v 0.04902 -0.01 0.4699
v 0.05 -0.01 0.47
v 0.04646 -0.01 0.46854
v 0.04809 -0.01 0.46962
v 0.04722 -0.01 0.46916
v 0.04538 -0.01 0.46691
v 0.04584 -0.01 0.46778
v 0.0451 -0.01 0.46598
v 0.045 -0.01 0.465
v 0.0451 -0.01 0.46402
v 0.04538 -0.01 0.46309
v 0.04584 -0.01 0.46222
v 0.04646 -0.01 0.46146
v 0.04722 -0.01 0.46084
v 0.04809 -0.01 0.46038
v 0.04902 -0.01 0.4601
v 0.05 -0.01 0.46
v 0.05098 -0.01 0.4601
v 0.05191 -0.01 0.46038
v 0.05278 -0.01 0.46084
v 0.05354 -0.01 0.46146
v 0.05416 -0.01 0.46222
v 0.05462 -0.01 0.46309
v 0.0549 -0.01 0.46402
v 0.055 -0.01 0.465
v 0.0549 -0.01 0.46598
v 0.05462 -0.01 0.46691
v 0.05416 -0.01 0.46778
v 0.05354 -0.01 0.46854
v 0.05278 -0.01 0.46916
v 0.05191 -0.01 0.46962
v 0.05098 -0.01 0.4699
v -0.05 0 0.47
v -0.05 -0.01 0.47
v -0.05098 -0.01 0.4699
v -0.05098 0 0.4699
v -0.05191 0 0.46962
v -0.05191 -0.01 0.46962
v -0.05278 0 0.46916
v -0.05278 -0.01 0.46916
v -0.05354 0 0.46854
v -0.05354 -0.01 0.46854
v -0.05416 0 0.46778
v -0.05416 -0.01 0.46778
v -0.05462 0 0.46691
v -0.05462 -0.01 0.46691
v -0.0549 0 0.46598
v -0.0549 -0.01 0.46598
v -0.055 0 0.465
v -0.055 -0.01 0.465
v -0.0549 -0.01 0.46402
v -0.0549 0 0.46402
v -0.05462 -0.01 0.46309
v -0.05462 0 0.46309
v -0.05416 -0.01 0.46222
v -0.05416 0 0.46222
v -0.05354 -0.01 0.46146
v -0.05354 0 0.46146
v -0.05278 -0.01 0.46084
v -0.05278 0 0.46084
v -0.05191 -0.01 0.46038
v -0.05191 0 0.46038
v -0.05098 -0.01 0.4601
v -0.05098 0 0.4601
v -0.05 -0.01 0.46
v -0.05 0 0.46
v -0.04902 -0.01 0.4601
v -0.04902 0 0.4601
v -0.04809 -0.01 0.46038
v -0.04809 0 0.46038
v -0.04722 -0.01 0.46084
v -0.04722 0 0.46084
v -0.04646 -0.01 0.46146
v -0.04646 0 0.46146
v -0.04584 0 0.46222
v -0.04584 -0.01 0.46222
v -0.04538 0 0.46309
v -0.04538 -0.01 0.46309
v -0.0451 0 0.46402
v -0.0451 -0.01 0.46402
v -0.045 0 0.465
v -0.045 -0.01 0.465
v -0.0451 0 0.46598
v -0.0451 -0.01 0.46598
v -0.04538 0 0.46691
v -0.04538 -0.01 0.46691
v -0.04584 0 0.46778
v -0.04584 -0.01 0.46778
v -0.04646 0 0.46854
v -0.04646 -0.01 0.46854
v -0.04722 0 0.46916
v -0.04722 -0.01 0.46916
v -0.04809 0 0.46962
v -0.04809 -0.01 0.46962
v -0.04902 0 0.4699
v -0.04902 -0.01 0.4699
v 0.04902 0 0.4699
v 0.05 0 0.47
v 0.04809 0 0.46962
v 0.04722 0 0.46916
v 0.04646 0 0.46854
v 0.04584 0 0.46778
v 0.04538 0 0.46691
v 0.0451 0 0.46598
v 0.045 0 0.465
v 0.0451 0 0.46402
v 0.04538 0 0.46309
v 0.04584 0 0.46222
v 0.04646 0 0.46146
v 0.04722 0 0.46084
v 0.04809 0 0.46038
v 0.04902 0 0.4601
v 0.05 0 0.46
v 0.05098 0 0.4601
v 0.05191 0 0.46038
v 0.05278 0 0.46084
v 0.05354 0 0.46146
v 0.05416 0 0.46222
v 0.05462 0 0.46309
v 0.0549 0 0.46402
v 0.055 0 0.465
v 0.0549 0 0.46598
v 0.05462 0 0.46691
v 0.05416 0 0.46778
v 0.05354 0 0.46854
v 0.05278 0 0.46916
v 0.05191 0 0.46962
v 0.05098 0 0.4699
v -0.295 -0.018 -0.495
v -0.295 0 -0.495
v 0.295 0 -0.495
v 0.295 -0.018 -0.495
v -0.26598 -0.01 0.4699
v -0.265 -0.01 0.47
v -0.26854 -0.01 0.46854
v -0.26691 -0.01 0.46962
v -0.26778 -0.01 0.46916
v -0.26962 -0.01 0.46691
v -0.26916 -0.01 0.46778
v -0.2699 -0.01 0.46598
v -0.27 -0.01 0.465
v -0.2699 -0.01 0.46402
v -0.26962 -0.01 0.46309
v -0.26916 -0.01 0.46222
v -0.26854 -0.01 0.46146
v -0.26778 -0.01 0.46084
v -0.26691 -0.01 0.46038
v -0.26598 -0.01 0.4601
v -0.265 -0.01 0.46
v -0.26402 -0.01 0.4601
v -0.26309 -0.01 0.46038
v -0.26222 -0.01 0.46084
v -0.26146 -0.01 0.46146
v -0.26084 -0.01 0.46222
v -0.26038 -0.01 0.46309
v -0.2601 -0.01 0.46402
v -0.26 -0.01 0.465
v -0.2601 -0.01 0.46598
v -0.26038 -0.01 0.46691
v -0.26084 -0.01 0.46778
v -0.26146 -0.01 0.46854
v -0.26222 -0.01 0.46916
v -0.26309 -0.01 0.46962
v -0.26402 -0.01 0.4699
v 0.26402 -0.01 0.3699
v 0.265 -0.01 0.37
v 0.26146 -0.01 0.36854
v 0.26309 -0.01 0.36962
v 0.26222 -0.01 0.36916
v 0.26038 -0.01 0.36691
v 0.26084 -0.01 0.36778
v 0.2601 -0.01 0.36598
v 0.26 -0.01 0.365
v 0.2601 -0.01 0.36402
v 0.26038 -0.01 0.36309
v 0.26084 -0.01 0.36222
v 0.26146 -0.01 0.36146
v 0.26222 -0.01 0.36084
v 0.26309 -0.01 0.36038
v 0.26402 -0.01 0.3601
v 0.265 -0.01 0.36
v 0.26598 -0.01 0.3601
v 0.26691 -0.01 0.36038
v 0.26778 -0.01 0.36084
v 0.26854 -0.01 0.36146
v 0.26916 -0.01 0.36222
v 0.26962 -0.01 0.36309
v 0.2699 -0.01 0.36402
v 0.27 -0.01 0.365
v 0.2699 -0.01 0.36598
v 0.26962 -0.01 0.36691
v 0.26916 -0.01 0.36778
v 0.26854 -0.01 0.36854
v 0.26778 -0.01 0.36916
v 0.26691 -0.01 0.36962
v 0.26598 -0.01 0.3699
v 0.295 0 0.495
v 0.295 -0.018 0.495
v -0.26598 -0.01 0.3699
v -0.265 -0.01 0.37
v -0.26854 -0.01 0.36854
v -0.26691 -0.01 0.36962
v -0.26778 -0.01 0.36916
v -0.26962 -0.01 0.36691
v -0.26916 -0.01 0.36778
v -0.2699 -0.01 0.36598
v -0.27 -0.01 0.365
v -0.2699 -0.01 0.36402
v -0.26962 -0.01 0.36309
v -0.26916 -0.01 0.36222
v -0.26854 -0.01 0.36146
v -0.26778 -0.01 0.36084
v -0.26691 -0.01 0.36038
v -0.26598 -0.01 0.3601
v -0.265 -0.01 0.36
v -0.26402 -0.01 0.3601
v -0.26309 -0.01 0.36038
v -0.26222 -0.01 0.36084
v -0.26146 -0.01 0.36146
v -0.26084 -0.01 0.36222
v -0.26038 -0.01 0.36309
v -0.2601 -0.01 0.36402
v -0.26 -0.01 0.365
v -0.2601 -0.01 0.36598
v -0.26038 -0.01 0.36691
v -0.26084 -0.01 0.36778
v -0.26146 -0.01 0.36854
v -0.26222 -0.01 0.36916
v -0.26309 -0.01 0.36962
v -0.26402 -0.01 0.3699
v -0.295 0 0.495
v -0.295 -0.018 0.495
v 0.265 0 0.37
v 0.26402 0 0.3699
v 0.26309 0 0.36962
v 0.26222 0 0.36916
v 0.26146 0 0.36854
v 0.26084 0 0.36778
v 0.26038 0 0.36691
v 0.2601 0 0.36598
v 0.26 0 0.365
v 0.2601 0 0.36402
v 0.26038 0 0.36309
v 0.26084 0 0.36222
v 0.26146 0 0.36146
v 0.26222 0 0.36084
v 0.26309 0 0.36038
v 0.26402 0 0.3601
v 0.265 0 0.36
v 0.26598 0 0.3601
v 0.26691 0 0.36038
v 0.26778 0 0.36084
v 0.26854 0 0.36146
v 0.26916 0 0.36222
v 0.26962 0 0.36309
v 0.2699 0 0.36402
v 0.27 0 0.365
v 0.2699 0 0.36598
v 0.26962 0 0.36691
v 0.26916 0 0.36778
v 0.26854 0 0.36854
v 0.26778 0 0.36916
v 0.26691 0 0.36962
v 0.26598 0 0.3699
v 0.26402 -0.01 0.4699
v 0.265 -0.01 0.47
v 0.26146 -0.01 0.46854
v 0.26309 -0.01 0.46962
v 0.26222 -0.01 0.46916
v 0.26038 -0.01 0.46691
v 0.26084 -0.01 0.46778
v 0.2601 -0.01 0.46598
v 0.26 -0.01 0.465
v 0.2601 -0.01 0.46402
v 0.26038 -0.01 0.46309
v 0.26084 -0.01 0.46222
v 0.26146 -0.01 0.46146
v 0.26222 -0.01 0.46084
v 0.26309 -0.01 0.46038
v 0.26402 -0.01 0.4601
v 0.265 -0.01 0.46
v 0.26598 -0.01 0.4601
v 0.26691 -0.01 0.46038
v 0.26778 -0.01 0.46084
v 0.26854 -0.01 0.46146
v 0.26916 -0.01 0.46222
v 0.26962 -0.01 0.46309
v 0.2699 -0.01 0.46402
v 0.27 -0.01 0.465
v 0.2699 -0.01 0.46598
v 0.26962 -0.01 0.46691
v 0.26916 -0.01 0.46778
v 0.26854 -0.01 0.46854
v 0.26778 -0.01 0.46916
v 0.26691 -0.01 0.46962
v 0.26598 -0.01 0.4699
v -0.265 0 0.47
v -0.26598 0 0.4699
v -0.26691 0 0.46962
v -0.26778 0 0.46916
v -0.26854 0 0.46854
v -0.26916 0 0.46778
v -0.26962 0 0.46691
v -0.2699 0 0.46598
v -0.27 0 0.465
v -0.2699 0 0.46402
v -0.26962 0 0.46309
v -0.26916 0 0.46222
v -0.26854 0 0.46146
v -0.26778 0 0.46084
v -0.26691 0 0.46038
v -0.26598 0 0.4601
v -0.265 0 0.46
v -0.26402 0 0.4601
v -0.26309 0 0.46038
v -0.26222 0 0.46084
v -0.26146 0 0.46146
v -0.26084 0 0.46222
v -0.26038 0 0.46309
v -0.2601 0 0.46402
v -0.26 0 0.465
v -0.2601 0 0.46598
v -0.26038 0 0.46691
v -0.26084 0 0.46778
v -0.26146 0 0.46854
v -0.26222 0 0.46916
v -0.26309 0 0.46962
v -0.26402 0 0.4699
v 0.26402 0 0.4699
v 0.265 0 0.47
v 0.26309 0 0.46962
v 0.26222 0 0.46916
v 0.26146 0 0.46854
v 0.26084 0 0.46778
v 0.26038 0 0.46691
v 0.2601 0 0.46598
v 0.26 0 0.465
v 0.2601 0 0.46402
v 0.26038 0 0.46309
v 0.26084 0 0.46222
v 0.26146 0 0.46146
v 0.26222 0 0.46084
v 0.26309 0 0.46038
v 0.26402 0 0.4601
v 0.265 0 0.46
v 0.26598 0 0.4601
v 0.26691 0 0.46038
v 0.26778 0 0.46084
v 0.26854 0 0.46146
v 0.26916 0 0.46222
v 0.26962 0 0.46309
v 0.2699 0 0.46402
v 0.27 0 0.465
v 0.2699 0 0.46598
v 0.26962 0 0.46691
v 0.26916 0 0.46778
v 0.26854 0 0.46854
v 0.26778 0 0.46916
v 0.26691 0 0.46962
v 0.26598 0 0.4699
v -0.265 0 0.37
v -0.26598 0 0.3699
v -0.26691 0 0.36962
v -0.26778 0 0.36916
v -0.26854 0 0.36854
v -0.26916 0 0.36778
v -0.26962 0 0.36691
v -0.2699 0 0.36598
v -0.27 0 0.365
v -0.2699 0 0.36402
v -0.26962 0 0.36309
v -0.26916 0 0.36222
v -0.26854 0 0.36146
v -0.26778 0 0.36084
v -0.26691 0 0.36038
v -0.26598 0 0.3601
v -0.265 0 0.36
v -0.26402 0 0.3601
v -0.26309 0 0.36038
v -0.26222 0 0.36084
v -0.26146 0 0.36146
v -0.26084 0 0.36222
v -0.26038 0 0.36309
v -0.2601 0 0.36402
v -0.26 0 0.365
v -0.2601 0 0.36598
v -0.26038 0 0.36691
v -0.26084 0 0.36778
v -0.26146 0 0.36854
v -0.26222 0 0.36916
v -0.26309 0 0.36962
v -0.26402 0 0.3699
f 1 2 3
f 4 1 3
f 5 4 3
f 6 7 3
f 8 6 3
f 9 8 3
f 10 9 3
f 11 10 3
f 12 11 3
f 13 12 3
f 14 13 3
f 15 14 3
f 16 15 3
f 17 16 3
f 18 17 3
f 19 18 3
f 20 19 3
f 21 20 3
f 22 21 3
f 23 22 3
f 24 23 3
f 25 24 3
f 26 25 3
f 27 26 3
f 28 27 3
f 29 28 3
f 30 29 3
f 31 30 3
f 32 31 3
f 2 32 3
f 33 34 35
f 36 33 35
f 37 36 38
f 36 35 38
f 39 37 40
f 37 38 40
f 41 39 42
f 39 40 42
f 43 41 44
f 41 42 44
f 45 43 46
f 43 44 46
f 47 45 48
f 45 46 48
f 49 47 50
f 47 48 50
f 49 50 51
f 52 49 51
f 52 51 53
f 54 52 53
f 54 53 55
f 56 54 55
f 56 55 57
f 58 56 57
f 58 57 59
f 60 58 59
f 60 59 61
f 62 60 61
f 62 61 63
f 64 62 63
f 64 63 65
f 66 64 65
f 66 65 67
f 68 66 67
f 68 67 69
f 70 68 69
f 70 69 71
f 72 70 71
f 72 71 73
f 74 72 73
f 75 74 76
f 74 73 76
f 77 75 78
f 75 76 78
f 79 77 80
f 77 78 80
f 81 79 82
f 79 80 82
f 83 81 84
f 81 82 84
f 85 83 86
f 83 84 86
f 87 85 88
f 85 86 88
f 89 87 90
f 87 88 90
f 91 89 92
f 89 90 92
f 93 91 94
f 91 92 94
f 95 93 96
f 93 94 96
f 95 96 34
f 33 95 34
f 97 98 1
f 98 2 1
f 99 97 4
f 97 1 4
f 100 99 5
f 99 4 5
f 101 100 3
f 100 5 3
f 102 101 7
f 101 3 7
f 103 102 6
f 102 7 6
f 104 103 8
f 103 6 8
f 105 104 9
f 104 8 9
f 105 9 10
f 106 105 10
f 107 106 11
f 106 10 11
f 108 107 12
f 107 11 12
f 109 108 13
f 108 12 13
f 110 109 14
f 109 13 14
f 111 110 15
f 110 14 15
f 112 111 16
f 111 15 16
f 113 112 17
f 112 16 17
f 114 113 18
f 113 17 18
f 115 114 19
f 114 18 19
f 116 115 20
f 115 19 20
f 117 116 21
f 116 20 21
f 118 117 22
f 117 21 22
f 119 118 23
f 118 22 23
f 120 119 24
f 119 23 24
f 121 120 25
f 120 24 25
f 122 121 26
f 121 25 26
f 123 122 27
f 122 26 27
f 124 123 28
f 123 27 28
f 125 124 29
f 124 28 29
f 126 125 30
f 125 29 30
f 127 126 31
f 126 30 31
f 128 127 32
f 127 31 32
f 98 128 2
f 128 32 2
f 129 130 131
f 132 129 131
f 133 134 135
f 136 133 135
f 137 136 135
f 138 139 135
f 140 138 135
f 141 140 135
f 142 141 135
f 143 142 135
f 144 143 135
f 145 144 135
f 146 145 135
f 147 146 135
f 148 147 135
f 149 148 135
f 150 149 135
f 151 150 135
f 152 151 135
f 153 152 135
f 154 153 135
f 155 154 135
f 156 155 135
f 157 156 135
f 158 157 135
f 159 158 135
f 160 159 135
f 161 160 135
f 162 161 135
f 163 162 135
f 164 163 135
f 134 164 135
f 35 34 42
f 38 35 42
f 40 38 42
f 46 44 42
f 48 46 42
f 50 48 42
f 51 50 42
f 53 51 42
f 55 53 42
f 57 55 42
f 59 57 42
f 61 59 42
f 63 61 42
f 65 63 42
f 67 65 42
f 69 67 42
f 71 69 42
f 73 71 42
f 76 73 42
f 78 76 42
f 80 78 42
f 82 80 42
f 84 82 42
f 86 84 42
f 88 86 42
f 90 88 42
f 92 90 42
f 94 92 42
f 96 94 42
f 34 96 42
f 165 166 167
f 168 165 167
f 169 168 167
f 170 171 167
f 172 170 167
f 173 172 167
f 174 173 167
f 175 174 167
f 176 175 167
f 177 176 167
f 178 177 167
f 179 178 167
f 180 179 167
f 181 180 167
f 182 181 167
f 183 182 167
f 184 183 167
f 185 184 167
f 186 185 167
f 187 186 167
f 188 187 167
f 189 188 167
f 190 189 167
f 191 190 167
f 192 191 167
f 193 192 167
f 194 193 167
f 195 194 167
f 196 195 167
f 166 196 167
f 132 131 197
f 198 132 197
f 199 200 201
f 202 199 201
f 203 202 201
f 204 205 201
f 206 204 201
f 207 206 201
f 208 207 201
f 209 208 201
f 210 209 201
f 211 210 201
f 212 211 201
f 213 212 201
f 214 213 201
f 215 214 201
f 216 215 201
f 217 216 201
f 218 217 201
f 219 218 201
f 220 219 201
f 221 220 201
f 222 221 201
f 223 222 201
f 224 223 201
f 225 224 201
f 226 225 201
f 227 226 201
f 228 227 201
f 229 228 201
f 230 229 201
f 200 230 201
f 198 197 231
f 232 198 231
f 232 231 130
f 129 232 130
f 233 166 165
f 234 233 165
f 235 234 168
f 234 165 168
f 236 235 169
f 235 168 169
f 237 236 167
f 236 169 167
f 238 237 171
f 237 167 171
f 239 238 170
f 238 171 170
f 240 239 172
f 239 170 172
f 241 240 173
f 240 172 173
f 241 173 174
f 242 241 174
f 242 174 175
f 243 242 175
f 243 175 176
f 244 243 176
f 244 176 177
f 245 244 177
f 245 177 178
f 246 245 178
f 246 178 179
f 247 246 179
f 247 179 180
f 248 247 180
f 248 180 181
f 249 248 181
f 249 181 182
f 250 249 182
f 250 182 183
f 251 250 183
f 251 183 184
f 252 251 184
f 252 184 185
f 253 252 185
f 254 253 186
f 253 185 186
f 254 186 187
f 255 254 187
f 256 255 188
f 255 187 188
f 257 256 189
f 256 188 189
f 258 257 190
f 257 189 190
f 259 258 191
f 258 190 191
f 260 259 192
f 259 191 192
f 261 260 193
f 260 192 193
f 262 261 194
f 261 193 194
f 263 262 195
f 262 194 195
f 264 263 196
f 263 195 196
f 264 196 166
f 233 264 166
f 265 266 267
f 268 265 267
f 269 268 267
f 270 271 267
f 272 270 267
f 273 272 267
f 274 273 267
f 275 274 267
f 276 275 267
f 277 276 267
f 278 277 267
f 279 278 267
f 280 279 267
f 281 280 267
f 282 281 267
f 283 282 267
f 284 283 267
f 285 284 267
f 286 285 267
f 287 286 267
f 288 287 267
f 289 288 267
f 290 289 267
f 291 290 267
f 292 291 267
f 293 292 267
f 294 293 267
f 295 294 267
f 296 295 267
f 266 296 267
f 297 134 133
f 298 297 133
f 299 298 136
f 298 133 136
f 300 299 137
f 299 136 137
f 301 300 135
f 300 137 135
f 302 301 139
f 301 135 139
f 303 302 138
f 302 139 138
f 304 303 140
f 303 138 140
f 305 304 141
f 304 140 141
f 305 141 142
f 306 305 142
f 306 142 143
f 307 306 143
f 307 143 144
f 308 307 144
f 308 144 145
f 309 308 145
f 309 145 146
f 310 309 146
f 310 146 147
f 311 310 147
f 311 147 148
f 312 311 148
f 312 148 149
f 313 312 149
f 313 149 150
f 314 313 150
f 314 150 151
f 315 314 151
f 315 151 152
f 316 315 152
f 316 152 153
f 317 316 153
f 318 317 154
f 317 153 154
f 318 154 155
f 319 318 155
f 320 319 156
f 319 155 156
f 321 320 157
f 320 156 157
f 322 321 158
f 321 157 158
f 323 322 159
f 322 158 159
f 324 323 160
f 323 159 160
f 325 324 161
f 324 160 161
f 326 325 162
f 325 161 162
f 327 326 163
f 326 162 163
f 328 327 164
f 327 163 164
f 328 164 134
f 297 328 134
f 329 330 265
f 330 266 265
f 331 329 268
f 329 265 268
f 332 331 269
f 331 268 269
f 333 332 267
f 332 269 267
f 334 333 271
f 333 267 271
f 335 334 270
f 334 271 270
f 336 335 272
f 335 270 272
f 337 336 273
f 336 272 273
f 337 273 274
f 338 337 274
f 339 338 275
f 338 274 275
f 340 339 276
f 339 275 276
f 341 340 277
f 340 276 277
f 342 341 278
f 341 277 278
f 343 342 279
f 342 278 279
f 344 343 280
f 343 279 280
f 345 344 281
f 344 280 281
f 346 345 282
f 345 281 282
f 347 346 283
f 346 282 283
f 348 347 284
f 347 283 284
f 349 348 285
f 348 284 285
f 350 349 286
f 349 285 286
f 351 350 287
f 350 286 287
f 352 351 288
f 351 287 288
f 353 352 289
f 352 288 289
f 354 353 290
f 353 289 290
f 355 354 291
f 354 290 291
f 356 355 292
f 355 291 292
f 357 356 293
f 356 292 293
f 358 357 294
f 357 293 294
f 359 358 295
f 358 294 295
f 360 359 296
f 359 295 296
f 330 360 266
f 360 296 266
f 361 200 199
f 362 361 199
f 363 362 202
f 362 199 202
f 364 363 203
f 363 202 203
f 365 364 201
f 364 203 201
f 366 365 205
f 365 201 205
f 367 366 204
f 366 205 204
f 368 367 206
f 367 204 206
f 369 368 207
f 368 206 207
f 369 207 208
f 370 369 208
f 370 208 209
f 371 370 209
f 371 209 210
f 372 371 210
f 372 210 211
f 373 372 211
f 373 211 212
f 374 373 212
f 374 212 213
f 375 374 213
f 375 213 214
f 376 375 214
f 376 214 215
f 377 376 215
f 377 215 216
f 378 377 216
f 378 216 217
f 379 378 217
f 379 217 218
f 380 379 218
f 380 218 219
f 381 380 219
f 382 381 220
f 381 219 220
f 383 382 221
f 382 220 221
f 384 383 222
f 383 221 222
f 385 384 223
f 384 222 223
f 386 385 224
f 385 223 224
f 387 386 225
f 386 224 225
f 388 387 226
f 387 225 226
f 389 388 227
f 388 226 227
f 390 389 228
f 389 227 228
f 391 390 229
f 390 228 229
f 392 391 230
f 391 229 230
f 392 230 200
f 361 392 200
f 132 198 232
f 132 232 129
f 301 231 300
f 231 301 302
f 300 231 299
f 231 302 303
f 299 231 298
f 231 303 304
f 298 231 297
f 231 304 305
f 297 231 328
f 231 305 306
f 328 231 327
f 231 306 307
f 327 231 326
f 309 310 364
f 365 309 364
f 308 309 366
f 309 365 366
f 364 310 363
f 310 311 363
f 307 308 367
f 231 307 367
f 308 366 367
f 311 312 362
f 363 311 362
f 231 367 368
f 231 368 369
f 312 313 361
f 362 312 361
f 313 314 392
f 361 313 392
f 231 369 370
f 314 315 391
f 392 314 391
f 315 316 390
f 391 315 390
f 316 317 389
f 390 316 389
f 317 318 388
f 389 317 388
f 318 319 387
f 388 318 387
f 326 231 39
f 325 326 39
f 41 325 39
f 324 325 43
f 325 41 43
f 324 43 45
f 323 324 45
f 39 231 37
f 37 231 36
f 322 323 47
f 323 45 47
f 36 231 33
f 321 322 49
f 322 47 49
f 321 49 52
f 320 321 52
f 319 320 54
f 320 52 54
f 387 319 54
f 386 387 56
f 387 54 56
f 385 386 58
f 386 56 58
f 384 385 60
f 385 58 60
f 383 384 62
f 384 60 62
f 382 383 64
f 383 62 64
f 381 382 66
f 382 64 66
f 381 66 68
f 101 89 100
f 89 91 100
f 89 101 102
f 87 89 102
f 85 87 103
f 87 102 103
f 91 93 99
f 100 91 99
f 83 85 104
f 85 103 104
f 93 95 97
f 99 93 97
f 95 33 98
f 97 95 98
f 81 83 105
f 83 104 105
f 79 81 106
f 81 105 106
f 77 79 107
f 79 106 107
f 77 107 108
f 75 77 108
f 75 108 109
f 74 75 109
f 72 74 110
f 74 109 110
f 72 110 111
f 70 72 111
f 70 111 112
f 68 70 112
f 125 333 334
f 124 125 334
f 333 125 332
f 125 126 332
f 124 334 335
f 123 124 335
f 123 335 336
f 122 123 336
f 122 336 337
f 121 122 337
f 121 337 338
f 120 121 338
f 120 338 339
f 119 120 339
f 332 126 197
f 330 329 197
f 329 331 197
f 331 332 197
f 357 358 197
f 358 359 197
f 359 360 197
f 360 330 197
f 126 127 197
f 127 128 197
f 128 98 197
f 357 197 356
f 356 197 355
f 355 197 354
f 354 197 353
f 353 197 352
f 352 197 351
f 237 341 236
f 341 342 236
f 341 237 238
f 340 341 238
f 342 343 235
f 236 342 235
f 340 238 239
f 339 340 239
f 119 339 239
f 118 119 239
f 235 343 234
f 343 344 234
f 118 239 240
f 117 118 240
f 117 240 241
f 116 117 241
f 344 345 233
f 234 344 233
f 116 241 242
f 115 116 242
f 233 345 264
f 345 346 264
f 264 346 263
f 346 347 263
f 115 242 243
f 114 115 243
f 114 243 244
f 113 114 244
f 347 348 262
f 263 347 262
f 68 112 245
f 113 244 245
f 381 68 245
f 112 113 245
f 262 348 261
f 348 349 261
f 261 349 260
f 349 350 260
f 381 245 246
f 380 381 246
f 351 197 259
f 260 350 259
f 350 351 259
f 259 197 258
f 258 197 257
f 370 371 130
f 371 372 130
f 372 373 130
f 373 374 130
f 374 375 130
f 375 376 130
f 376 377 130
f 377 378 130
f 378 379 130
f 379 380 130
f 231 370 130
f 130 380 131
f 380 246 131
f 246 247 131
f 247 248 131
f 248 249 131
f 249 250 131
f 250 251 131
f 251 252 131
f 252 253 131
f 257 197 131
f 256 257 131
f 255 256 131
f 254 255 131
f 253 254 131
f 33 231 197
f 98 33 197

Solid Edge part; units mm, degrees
sketch "Sketch1" plane through (0, 0, 0) normal (0, -1, 0) x (1, 0, 0)
  line L0 (-0.295, -0.495) -> (0.295, -0.495)
  line L1 (0.295, -0.495) -> (0.295, 0.495)
  line L2 (0.295, 0.495) -> (-0.295, 0.495)
  line L3 (-0.295, 0.495) -> (-0.295, -0.495)
  dimension "D1" = 0.99
  dimension "D2" = 0.59
extrude "Protrusion1" add sketch "Sketch1" along normal blind 0.018
hole "Bohrung_1" at (-0.05, 0, 0.465) direction (0, -1, 0) diameter 0.01 depth 0.01
hole "Hole1" at (0.05, 0, 0.465) direction (0, -1, 0) diameter 0.01 depth 0.01
hole "Hole2" at (0.265, 0, 0.465) direction (0, -1, 0) diameter 0.01 depth 0.01
hole "Hole3" at (0.265, 0, 0.365) direction (0, -1, 0) diameter 0.01 depth 0.01
hole "Hole4" at (-0.265, 0, 0.365) direction (0, -1, 0) diameter 0.01 depth 0.01
hole "Hole5" at (-0.265, 0, 0.465) direction (0, -1, 0) diameter 0.01 depth 0.01
